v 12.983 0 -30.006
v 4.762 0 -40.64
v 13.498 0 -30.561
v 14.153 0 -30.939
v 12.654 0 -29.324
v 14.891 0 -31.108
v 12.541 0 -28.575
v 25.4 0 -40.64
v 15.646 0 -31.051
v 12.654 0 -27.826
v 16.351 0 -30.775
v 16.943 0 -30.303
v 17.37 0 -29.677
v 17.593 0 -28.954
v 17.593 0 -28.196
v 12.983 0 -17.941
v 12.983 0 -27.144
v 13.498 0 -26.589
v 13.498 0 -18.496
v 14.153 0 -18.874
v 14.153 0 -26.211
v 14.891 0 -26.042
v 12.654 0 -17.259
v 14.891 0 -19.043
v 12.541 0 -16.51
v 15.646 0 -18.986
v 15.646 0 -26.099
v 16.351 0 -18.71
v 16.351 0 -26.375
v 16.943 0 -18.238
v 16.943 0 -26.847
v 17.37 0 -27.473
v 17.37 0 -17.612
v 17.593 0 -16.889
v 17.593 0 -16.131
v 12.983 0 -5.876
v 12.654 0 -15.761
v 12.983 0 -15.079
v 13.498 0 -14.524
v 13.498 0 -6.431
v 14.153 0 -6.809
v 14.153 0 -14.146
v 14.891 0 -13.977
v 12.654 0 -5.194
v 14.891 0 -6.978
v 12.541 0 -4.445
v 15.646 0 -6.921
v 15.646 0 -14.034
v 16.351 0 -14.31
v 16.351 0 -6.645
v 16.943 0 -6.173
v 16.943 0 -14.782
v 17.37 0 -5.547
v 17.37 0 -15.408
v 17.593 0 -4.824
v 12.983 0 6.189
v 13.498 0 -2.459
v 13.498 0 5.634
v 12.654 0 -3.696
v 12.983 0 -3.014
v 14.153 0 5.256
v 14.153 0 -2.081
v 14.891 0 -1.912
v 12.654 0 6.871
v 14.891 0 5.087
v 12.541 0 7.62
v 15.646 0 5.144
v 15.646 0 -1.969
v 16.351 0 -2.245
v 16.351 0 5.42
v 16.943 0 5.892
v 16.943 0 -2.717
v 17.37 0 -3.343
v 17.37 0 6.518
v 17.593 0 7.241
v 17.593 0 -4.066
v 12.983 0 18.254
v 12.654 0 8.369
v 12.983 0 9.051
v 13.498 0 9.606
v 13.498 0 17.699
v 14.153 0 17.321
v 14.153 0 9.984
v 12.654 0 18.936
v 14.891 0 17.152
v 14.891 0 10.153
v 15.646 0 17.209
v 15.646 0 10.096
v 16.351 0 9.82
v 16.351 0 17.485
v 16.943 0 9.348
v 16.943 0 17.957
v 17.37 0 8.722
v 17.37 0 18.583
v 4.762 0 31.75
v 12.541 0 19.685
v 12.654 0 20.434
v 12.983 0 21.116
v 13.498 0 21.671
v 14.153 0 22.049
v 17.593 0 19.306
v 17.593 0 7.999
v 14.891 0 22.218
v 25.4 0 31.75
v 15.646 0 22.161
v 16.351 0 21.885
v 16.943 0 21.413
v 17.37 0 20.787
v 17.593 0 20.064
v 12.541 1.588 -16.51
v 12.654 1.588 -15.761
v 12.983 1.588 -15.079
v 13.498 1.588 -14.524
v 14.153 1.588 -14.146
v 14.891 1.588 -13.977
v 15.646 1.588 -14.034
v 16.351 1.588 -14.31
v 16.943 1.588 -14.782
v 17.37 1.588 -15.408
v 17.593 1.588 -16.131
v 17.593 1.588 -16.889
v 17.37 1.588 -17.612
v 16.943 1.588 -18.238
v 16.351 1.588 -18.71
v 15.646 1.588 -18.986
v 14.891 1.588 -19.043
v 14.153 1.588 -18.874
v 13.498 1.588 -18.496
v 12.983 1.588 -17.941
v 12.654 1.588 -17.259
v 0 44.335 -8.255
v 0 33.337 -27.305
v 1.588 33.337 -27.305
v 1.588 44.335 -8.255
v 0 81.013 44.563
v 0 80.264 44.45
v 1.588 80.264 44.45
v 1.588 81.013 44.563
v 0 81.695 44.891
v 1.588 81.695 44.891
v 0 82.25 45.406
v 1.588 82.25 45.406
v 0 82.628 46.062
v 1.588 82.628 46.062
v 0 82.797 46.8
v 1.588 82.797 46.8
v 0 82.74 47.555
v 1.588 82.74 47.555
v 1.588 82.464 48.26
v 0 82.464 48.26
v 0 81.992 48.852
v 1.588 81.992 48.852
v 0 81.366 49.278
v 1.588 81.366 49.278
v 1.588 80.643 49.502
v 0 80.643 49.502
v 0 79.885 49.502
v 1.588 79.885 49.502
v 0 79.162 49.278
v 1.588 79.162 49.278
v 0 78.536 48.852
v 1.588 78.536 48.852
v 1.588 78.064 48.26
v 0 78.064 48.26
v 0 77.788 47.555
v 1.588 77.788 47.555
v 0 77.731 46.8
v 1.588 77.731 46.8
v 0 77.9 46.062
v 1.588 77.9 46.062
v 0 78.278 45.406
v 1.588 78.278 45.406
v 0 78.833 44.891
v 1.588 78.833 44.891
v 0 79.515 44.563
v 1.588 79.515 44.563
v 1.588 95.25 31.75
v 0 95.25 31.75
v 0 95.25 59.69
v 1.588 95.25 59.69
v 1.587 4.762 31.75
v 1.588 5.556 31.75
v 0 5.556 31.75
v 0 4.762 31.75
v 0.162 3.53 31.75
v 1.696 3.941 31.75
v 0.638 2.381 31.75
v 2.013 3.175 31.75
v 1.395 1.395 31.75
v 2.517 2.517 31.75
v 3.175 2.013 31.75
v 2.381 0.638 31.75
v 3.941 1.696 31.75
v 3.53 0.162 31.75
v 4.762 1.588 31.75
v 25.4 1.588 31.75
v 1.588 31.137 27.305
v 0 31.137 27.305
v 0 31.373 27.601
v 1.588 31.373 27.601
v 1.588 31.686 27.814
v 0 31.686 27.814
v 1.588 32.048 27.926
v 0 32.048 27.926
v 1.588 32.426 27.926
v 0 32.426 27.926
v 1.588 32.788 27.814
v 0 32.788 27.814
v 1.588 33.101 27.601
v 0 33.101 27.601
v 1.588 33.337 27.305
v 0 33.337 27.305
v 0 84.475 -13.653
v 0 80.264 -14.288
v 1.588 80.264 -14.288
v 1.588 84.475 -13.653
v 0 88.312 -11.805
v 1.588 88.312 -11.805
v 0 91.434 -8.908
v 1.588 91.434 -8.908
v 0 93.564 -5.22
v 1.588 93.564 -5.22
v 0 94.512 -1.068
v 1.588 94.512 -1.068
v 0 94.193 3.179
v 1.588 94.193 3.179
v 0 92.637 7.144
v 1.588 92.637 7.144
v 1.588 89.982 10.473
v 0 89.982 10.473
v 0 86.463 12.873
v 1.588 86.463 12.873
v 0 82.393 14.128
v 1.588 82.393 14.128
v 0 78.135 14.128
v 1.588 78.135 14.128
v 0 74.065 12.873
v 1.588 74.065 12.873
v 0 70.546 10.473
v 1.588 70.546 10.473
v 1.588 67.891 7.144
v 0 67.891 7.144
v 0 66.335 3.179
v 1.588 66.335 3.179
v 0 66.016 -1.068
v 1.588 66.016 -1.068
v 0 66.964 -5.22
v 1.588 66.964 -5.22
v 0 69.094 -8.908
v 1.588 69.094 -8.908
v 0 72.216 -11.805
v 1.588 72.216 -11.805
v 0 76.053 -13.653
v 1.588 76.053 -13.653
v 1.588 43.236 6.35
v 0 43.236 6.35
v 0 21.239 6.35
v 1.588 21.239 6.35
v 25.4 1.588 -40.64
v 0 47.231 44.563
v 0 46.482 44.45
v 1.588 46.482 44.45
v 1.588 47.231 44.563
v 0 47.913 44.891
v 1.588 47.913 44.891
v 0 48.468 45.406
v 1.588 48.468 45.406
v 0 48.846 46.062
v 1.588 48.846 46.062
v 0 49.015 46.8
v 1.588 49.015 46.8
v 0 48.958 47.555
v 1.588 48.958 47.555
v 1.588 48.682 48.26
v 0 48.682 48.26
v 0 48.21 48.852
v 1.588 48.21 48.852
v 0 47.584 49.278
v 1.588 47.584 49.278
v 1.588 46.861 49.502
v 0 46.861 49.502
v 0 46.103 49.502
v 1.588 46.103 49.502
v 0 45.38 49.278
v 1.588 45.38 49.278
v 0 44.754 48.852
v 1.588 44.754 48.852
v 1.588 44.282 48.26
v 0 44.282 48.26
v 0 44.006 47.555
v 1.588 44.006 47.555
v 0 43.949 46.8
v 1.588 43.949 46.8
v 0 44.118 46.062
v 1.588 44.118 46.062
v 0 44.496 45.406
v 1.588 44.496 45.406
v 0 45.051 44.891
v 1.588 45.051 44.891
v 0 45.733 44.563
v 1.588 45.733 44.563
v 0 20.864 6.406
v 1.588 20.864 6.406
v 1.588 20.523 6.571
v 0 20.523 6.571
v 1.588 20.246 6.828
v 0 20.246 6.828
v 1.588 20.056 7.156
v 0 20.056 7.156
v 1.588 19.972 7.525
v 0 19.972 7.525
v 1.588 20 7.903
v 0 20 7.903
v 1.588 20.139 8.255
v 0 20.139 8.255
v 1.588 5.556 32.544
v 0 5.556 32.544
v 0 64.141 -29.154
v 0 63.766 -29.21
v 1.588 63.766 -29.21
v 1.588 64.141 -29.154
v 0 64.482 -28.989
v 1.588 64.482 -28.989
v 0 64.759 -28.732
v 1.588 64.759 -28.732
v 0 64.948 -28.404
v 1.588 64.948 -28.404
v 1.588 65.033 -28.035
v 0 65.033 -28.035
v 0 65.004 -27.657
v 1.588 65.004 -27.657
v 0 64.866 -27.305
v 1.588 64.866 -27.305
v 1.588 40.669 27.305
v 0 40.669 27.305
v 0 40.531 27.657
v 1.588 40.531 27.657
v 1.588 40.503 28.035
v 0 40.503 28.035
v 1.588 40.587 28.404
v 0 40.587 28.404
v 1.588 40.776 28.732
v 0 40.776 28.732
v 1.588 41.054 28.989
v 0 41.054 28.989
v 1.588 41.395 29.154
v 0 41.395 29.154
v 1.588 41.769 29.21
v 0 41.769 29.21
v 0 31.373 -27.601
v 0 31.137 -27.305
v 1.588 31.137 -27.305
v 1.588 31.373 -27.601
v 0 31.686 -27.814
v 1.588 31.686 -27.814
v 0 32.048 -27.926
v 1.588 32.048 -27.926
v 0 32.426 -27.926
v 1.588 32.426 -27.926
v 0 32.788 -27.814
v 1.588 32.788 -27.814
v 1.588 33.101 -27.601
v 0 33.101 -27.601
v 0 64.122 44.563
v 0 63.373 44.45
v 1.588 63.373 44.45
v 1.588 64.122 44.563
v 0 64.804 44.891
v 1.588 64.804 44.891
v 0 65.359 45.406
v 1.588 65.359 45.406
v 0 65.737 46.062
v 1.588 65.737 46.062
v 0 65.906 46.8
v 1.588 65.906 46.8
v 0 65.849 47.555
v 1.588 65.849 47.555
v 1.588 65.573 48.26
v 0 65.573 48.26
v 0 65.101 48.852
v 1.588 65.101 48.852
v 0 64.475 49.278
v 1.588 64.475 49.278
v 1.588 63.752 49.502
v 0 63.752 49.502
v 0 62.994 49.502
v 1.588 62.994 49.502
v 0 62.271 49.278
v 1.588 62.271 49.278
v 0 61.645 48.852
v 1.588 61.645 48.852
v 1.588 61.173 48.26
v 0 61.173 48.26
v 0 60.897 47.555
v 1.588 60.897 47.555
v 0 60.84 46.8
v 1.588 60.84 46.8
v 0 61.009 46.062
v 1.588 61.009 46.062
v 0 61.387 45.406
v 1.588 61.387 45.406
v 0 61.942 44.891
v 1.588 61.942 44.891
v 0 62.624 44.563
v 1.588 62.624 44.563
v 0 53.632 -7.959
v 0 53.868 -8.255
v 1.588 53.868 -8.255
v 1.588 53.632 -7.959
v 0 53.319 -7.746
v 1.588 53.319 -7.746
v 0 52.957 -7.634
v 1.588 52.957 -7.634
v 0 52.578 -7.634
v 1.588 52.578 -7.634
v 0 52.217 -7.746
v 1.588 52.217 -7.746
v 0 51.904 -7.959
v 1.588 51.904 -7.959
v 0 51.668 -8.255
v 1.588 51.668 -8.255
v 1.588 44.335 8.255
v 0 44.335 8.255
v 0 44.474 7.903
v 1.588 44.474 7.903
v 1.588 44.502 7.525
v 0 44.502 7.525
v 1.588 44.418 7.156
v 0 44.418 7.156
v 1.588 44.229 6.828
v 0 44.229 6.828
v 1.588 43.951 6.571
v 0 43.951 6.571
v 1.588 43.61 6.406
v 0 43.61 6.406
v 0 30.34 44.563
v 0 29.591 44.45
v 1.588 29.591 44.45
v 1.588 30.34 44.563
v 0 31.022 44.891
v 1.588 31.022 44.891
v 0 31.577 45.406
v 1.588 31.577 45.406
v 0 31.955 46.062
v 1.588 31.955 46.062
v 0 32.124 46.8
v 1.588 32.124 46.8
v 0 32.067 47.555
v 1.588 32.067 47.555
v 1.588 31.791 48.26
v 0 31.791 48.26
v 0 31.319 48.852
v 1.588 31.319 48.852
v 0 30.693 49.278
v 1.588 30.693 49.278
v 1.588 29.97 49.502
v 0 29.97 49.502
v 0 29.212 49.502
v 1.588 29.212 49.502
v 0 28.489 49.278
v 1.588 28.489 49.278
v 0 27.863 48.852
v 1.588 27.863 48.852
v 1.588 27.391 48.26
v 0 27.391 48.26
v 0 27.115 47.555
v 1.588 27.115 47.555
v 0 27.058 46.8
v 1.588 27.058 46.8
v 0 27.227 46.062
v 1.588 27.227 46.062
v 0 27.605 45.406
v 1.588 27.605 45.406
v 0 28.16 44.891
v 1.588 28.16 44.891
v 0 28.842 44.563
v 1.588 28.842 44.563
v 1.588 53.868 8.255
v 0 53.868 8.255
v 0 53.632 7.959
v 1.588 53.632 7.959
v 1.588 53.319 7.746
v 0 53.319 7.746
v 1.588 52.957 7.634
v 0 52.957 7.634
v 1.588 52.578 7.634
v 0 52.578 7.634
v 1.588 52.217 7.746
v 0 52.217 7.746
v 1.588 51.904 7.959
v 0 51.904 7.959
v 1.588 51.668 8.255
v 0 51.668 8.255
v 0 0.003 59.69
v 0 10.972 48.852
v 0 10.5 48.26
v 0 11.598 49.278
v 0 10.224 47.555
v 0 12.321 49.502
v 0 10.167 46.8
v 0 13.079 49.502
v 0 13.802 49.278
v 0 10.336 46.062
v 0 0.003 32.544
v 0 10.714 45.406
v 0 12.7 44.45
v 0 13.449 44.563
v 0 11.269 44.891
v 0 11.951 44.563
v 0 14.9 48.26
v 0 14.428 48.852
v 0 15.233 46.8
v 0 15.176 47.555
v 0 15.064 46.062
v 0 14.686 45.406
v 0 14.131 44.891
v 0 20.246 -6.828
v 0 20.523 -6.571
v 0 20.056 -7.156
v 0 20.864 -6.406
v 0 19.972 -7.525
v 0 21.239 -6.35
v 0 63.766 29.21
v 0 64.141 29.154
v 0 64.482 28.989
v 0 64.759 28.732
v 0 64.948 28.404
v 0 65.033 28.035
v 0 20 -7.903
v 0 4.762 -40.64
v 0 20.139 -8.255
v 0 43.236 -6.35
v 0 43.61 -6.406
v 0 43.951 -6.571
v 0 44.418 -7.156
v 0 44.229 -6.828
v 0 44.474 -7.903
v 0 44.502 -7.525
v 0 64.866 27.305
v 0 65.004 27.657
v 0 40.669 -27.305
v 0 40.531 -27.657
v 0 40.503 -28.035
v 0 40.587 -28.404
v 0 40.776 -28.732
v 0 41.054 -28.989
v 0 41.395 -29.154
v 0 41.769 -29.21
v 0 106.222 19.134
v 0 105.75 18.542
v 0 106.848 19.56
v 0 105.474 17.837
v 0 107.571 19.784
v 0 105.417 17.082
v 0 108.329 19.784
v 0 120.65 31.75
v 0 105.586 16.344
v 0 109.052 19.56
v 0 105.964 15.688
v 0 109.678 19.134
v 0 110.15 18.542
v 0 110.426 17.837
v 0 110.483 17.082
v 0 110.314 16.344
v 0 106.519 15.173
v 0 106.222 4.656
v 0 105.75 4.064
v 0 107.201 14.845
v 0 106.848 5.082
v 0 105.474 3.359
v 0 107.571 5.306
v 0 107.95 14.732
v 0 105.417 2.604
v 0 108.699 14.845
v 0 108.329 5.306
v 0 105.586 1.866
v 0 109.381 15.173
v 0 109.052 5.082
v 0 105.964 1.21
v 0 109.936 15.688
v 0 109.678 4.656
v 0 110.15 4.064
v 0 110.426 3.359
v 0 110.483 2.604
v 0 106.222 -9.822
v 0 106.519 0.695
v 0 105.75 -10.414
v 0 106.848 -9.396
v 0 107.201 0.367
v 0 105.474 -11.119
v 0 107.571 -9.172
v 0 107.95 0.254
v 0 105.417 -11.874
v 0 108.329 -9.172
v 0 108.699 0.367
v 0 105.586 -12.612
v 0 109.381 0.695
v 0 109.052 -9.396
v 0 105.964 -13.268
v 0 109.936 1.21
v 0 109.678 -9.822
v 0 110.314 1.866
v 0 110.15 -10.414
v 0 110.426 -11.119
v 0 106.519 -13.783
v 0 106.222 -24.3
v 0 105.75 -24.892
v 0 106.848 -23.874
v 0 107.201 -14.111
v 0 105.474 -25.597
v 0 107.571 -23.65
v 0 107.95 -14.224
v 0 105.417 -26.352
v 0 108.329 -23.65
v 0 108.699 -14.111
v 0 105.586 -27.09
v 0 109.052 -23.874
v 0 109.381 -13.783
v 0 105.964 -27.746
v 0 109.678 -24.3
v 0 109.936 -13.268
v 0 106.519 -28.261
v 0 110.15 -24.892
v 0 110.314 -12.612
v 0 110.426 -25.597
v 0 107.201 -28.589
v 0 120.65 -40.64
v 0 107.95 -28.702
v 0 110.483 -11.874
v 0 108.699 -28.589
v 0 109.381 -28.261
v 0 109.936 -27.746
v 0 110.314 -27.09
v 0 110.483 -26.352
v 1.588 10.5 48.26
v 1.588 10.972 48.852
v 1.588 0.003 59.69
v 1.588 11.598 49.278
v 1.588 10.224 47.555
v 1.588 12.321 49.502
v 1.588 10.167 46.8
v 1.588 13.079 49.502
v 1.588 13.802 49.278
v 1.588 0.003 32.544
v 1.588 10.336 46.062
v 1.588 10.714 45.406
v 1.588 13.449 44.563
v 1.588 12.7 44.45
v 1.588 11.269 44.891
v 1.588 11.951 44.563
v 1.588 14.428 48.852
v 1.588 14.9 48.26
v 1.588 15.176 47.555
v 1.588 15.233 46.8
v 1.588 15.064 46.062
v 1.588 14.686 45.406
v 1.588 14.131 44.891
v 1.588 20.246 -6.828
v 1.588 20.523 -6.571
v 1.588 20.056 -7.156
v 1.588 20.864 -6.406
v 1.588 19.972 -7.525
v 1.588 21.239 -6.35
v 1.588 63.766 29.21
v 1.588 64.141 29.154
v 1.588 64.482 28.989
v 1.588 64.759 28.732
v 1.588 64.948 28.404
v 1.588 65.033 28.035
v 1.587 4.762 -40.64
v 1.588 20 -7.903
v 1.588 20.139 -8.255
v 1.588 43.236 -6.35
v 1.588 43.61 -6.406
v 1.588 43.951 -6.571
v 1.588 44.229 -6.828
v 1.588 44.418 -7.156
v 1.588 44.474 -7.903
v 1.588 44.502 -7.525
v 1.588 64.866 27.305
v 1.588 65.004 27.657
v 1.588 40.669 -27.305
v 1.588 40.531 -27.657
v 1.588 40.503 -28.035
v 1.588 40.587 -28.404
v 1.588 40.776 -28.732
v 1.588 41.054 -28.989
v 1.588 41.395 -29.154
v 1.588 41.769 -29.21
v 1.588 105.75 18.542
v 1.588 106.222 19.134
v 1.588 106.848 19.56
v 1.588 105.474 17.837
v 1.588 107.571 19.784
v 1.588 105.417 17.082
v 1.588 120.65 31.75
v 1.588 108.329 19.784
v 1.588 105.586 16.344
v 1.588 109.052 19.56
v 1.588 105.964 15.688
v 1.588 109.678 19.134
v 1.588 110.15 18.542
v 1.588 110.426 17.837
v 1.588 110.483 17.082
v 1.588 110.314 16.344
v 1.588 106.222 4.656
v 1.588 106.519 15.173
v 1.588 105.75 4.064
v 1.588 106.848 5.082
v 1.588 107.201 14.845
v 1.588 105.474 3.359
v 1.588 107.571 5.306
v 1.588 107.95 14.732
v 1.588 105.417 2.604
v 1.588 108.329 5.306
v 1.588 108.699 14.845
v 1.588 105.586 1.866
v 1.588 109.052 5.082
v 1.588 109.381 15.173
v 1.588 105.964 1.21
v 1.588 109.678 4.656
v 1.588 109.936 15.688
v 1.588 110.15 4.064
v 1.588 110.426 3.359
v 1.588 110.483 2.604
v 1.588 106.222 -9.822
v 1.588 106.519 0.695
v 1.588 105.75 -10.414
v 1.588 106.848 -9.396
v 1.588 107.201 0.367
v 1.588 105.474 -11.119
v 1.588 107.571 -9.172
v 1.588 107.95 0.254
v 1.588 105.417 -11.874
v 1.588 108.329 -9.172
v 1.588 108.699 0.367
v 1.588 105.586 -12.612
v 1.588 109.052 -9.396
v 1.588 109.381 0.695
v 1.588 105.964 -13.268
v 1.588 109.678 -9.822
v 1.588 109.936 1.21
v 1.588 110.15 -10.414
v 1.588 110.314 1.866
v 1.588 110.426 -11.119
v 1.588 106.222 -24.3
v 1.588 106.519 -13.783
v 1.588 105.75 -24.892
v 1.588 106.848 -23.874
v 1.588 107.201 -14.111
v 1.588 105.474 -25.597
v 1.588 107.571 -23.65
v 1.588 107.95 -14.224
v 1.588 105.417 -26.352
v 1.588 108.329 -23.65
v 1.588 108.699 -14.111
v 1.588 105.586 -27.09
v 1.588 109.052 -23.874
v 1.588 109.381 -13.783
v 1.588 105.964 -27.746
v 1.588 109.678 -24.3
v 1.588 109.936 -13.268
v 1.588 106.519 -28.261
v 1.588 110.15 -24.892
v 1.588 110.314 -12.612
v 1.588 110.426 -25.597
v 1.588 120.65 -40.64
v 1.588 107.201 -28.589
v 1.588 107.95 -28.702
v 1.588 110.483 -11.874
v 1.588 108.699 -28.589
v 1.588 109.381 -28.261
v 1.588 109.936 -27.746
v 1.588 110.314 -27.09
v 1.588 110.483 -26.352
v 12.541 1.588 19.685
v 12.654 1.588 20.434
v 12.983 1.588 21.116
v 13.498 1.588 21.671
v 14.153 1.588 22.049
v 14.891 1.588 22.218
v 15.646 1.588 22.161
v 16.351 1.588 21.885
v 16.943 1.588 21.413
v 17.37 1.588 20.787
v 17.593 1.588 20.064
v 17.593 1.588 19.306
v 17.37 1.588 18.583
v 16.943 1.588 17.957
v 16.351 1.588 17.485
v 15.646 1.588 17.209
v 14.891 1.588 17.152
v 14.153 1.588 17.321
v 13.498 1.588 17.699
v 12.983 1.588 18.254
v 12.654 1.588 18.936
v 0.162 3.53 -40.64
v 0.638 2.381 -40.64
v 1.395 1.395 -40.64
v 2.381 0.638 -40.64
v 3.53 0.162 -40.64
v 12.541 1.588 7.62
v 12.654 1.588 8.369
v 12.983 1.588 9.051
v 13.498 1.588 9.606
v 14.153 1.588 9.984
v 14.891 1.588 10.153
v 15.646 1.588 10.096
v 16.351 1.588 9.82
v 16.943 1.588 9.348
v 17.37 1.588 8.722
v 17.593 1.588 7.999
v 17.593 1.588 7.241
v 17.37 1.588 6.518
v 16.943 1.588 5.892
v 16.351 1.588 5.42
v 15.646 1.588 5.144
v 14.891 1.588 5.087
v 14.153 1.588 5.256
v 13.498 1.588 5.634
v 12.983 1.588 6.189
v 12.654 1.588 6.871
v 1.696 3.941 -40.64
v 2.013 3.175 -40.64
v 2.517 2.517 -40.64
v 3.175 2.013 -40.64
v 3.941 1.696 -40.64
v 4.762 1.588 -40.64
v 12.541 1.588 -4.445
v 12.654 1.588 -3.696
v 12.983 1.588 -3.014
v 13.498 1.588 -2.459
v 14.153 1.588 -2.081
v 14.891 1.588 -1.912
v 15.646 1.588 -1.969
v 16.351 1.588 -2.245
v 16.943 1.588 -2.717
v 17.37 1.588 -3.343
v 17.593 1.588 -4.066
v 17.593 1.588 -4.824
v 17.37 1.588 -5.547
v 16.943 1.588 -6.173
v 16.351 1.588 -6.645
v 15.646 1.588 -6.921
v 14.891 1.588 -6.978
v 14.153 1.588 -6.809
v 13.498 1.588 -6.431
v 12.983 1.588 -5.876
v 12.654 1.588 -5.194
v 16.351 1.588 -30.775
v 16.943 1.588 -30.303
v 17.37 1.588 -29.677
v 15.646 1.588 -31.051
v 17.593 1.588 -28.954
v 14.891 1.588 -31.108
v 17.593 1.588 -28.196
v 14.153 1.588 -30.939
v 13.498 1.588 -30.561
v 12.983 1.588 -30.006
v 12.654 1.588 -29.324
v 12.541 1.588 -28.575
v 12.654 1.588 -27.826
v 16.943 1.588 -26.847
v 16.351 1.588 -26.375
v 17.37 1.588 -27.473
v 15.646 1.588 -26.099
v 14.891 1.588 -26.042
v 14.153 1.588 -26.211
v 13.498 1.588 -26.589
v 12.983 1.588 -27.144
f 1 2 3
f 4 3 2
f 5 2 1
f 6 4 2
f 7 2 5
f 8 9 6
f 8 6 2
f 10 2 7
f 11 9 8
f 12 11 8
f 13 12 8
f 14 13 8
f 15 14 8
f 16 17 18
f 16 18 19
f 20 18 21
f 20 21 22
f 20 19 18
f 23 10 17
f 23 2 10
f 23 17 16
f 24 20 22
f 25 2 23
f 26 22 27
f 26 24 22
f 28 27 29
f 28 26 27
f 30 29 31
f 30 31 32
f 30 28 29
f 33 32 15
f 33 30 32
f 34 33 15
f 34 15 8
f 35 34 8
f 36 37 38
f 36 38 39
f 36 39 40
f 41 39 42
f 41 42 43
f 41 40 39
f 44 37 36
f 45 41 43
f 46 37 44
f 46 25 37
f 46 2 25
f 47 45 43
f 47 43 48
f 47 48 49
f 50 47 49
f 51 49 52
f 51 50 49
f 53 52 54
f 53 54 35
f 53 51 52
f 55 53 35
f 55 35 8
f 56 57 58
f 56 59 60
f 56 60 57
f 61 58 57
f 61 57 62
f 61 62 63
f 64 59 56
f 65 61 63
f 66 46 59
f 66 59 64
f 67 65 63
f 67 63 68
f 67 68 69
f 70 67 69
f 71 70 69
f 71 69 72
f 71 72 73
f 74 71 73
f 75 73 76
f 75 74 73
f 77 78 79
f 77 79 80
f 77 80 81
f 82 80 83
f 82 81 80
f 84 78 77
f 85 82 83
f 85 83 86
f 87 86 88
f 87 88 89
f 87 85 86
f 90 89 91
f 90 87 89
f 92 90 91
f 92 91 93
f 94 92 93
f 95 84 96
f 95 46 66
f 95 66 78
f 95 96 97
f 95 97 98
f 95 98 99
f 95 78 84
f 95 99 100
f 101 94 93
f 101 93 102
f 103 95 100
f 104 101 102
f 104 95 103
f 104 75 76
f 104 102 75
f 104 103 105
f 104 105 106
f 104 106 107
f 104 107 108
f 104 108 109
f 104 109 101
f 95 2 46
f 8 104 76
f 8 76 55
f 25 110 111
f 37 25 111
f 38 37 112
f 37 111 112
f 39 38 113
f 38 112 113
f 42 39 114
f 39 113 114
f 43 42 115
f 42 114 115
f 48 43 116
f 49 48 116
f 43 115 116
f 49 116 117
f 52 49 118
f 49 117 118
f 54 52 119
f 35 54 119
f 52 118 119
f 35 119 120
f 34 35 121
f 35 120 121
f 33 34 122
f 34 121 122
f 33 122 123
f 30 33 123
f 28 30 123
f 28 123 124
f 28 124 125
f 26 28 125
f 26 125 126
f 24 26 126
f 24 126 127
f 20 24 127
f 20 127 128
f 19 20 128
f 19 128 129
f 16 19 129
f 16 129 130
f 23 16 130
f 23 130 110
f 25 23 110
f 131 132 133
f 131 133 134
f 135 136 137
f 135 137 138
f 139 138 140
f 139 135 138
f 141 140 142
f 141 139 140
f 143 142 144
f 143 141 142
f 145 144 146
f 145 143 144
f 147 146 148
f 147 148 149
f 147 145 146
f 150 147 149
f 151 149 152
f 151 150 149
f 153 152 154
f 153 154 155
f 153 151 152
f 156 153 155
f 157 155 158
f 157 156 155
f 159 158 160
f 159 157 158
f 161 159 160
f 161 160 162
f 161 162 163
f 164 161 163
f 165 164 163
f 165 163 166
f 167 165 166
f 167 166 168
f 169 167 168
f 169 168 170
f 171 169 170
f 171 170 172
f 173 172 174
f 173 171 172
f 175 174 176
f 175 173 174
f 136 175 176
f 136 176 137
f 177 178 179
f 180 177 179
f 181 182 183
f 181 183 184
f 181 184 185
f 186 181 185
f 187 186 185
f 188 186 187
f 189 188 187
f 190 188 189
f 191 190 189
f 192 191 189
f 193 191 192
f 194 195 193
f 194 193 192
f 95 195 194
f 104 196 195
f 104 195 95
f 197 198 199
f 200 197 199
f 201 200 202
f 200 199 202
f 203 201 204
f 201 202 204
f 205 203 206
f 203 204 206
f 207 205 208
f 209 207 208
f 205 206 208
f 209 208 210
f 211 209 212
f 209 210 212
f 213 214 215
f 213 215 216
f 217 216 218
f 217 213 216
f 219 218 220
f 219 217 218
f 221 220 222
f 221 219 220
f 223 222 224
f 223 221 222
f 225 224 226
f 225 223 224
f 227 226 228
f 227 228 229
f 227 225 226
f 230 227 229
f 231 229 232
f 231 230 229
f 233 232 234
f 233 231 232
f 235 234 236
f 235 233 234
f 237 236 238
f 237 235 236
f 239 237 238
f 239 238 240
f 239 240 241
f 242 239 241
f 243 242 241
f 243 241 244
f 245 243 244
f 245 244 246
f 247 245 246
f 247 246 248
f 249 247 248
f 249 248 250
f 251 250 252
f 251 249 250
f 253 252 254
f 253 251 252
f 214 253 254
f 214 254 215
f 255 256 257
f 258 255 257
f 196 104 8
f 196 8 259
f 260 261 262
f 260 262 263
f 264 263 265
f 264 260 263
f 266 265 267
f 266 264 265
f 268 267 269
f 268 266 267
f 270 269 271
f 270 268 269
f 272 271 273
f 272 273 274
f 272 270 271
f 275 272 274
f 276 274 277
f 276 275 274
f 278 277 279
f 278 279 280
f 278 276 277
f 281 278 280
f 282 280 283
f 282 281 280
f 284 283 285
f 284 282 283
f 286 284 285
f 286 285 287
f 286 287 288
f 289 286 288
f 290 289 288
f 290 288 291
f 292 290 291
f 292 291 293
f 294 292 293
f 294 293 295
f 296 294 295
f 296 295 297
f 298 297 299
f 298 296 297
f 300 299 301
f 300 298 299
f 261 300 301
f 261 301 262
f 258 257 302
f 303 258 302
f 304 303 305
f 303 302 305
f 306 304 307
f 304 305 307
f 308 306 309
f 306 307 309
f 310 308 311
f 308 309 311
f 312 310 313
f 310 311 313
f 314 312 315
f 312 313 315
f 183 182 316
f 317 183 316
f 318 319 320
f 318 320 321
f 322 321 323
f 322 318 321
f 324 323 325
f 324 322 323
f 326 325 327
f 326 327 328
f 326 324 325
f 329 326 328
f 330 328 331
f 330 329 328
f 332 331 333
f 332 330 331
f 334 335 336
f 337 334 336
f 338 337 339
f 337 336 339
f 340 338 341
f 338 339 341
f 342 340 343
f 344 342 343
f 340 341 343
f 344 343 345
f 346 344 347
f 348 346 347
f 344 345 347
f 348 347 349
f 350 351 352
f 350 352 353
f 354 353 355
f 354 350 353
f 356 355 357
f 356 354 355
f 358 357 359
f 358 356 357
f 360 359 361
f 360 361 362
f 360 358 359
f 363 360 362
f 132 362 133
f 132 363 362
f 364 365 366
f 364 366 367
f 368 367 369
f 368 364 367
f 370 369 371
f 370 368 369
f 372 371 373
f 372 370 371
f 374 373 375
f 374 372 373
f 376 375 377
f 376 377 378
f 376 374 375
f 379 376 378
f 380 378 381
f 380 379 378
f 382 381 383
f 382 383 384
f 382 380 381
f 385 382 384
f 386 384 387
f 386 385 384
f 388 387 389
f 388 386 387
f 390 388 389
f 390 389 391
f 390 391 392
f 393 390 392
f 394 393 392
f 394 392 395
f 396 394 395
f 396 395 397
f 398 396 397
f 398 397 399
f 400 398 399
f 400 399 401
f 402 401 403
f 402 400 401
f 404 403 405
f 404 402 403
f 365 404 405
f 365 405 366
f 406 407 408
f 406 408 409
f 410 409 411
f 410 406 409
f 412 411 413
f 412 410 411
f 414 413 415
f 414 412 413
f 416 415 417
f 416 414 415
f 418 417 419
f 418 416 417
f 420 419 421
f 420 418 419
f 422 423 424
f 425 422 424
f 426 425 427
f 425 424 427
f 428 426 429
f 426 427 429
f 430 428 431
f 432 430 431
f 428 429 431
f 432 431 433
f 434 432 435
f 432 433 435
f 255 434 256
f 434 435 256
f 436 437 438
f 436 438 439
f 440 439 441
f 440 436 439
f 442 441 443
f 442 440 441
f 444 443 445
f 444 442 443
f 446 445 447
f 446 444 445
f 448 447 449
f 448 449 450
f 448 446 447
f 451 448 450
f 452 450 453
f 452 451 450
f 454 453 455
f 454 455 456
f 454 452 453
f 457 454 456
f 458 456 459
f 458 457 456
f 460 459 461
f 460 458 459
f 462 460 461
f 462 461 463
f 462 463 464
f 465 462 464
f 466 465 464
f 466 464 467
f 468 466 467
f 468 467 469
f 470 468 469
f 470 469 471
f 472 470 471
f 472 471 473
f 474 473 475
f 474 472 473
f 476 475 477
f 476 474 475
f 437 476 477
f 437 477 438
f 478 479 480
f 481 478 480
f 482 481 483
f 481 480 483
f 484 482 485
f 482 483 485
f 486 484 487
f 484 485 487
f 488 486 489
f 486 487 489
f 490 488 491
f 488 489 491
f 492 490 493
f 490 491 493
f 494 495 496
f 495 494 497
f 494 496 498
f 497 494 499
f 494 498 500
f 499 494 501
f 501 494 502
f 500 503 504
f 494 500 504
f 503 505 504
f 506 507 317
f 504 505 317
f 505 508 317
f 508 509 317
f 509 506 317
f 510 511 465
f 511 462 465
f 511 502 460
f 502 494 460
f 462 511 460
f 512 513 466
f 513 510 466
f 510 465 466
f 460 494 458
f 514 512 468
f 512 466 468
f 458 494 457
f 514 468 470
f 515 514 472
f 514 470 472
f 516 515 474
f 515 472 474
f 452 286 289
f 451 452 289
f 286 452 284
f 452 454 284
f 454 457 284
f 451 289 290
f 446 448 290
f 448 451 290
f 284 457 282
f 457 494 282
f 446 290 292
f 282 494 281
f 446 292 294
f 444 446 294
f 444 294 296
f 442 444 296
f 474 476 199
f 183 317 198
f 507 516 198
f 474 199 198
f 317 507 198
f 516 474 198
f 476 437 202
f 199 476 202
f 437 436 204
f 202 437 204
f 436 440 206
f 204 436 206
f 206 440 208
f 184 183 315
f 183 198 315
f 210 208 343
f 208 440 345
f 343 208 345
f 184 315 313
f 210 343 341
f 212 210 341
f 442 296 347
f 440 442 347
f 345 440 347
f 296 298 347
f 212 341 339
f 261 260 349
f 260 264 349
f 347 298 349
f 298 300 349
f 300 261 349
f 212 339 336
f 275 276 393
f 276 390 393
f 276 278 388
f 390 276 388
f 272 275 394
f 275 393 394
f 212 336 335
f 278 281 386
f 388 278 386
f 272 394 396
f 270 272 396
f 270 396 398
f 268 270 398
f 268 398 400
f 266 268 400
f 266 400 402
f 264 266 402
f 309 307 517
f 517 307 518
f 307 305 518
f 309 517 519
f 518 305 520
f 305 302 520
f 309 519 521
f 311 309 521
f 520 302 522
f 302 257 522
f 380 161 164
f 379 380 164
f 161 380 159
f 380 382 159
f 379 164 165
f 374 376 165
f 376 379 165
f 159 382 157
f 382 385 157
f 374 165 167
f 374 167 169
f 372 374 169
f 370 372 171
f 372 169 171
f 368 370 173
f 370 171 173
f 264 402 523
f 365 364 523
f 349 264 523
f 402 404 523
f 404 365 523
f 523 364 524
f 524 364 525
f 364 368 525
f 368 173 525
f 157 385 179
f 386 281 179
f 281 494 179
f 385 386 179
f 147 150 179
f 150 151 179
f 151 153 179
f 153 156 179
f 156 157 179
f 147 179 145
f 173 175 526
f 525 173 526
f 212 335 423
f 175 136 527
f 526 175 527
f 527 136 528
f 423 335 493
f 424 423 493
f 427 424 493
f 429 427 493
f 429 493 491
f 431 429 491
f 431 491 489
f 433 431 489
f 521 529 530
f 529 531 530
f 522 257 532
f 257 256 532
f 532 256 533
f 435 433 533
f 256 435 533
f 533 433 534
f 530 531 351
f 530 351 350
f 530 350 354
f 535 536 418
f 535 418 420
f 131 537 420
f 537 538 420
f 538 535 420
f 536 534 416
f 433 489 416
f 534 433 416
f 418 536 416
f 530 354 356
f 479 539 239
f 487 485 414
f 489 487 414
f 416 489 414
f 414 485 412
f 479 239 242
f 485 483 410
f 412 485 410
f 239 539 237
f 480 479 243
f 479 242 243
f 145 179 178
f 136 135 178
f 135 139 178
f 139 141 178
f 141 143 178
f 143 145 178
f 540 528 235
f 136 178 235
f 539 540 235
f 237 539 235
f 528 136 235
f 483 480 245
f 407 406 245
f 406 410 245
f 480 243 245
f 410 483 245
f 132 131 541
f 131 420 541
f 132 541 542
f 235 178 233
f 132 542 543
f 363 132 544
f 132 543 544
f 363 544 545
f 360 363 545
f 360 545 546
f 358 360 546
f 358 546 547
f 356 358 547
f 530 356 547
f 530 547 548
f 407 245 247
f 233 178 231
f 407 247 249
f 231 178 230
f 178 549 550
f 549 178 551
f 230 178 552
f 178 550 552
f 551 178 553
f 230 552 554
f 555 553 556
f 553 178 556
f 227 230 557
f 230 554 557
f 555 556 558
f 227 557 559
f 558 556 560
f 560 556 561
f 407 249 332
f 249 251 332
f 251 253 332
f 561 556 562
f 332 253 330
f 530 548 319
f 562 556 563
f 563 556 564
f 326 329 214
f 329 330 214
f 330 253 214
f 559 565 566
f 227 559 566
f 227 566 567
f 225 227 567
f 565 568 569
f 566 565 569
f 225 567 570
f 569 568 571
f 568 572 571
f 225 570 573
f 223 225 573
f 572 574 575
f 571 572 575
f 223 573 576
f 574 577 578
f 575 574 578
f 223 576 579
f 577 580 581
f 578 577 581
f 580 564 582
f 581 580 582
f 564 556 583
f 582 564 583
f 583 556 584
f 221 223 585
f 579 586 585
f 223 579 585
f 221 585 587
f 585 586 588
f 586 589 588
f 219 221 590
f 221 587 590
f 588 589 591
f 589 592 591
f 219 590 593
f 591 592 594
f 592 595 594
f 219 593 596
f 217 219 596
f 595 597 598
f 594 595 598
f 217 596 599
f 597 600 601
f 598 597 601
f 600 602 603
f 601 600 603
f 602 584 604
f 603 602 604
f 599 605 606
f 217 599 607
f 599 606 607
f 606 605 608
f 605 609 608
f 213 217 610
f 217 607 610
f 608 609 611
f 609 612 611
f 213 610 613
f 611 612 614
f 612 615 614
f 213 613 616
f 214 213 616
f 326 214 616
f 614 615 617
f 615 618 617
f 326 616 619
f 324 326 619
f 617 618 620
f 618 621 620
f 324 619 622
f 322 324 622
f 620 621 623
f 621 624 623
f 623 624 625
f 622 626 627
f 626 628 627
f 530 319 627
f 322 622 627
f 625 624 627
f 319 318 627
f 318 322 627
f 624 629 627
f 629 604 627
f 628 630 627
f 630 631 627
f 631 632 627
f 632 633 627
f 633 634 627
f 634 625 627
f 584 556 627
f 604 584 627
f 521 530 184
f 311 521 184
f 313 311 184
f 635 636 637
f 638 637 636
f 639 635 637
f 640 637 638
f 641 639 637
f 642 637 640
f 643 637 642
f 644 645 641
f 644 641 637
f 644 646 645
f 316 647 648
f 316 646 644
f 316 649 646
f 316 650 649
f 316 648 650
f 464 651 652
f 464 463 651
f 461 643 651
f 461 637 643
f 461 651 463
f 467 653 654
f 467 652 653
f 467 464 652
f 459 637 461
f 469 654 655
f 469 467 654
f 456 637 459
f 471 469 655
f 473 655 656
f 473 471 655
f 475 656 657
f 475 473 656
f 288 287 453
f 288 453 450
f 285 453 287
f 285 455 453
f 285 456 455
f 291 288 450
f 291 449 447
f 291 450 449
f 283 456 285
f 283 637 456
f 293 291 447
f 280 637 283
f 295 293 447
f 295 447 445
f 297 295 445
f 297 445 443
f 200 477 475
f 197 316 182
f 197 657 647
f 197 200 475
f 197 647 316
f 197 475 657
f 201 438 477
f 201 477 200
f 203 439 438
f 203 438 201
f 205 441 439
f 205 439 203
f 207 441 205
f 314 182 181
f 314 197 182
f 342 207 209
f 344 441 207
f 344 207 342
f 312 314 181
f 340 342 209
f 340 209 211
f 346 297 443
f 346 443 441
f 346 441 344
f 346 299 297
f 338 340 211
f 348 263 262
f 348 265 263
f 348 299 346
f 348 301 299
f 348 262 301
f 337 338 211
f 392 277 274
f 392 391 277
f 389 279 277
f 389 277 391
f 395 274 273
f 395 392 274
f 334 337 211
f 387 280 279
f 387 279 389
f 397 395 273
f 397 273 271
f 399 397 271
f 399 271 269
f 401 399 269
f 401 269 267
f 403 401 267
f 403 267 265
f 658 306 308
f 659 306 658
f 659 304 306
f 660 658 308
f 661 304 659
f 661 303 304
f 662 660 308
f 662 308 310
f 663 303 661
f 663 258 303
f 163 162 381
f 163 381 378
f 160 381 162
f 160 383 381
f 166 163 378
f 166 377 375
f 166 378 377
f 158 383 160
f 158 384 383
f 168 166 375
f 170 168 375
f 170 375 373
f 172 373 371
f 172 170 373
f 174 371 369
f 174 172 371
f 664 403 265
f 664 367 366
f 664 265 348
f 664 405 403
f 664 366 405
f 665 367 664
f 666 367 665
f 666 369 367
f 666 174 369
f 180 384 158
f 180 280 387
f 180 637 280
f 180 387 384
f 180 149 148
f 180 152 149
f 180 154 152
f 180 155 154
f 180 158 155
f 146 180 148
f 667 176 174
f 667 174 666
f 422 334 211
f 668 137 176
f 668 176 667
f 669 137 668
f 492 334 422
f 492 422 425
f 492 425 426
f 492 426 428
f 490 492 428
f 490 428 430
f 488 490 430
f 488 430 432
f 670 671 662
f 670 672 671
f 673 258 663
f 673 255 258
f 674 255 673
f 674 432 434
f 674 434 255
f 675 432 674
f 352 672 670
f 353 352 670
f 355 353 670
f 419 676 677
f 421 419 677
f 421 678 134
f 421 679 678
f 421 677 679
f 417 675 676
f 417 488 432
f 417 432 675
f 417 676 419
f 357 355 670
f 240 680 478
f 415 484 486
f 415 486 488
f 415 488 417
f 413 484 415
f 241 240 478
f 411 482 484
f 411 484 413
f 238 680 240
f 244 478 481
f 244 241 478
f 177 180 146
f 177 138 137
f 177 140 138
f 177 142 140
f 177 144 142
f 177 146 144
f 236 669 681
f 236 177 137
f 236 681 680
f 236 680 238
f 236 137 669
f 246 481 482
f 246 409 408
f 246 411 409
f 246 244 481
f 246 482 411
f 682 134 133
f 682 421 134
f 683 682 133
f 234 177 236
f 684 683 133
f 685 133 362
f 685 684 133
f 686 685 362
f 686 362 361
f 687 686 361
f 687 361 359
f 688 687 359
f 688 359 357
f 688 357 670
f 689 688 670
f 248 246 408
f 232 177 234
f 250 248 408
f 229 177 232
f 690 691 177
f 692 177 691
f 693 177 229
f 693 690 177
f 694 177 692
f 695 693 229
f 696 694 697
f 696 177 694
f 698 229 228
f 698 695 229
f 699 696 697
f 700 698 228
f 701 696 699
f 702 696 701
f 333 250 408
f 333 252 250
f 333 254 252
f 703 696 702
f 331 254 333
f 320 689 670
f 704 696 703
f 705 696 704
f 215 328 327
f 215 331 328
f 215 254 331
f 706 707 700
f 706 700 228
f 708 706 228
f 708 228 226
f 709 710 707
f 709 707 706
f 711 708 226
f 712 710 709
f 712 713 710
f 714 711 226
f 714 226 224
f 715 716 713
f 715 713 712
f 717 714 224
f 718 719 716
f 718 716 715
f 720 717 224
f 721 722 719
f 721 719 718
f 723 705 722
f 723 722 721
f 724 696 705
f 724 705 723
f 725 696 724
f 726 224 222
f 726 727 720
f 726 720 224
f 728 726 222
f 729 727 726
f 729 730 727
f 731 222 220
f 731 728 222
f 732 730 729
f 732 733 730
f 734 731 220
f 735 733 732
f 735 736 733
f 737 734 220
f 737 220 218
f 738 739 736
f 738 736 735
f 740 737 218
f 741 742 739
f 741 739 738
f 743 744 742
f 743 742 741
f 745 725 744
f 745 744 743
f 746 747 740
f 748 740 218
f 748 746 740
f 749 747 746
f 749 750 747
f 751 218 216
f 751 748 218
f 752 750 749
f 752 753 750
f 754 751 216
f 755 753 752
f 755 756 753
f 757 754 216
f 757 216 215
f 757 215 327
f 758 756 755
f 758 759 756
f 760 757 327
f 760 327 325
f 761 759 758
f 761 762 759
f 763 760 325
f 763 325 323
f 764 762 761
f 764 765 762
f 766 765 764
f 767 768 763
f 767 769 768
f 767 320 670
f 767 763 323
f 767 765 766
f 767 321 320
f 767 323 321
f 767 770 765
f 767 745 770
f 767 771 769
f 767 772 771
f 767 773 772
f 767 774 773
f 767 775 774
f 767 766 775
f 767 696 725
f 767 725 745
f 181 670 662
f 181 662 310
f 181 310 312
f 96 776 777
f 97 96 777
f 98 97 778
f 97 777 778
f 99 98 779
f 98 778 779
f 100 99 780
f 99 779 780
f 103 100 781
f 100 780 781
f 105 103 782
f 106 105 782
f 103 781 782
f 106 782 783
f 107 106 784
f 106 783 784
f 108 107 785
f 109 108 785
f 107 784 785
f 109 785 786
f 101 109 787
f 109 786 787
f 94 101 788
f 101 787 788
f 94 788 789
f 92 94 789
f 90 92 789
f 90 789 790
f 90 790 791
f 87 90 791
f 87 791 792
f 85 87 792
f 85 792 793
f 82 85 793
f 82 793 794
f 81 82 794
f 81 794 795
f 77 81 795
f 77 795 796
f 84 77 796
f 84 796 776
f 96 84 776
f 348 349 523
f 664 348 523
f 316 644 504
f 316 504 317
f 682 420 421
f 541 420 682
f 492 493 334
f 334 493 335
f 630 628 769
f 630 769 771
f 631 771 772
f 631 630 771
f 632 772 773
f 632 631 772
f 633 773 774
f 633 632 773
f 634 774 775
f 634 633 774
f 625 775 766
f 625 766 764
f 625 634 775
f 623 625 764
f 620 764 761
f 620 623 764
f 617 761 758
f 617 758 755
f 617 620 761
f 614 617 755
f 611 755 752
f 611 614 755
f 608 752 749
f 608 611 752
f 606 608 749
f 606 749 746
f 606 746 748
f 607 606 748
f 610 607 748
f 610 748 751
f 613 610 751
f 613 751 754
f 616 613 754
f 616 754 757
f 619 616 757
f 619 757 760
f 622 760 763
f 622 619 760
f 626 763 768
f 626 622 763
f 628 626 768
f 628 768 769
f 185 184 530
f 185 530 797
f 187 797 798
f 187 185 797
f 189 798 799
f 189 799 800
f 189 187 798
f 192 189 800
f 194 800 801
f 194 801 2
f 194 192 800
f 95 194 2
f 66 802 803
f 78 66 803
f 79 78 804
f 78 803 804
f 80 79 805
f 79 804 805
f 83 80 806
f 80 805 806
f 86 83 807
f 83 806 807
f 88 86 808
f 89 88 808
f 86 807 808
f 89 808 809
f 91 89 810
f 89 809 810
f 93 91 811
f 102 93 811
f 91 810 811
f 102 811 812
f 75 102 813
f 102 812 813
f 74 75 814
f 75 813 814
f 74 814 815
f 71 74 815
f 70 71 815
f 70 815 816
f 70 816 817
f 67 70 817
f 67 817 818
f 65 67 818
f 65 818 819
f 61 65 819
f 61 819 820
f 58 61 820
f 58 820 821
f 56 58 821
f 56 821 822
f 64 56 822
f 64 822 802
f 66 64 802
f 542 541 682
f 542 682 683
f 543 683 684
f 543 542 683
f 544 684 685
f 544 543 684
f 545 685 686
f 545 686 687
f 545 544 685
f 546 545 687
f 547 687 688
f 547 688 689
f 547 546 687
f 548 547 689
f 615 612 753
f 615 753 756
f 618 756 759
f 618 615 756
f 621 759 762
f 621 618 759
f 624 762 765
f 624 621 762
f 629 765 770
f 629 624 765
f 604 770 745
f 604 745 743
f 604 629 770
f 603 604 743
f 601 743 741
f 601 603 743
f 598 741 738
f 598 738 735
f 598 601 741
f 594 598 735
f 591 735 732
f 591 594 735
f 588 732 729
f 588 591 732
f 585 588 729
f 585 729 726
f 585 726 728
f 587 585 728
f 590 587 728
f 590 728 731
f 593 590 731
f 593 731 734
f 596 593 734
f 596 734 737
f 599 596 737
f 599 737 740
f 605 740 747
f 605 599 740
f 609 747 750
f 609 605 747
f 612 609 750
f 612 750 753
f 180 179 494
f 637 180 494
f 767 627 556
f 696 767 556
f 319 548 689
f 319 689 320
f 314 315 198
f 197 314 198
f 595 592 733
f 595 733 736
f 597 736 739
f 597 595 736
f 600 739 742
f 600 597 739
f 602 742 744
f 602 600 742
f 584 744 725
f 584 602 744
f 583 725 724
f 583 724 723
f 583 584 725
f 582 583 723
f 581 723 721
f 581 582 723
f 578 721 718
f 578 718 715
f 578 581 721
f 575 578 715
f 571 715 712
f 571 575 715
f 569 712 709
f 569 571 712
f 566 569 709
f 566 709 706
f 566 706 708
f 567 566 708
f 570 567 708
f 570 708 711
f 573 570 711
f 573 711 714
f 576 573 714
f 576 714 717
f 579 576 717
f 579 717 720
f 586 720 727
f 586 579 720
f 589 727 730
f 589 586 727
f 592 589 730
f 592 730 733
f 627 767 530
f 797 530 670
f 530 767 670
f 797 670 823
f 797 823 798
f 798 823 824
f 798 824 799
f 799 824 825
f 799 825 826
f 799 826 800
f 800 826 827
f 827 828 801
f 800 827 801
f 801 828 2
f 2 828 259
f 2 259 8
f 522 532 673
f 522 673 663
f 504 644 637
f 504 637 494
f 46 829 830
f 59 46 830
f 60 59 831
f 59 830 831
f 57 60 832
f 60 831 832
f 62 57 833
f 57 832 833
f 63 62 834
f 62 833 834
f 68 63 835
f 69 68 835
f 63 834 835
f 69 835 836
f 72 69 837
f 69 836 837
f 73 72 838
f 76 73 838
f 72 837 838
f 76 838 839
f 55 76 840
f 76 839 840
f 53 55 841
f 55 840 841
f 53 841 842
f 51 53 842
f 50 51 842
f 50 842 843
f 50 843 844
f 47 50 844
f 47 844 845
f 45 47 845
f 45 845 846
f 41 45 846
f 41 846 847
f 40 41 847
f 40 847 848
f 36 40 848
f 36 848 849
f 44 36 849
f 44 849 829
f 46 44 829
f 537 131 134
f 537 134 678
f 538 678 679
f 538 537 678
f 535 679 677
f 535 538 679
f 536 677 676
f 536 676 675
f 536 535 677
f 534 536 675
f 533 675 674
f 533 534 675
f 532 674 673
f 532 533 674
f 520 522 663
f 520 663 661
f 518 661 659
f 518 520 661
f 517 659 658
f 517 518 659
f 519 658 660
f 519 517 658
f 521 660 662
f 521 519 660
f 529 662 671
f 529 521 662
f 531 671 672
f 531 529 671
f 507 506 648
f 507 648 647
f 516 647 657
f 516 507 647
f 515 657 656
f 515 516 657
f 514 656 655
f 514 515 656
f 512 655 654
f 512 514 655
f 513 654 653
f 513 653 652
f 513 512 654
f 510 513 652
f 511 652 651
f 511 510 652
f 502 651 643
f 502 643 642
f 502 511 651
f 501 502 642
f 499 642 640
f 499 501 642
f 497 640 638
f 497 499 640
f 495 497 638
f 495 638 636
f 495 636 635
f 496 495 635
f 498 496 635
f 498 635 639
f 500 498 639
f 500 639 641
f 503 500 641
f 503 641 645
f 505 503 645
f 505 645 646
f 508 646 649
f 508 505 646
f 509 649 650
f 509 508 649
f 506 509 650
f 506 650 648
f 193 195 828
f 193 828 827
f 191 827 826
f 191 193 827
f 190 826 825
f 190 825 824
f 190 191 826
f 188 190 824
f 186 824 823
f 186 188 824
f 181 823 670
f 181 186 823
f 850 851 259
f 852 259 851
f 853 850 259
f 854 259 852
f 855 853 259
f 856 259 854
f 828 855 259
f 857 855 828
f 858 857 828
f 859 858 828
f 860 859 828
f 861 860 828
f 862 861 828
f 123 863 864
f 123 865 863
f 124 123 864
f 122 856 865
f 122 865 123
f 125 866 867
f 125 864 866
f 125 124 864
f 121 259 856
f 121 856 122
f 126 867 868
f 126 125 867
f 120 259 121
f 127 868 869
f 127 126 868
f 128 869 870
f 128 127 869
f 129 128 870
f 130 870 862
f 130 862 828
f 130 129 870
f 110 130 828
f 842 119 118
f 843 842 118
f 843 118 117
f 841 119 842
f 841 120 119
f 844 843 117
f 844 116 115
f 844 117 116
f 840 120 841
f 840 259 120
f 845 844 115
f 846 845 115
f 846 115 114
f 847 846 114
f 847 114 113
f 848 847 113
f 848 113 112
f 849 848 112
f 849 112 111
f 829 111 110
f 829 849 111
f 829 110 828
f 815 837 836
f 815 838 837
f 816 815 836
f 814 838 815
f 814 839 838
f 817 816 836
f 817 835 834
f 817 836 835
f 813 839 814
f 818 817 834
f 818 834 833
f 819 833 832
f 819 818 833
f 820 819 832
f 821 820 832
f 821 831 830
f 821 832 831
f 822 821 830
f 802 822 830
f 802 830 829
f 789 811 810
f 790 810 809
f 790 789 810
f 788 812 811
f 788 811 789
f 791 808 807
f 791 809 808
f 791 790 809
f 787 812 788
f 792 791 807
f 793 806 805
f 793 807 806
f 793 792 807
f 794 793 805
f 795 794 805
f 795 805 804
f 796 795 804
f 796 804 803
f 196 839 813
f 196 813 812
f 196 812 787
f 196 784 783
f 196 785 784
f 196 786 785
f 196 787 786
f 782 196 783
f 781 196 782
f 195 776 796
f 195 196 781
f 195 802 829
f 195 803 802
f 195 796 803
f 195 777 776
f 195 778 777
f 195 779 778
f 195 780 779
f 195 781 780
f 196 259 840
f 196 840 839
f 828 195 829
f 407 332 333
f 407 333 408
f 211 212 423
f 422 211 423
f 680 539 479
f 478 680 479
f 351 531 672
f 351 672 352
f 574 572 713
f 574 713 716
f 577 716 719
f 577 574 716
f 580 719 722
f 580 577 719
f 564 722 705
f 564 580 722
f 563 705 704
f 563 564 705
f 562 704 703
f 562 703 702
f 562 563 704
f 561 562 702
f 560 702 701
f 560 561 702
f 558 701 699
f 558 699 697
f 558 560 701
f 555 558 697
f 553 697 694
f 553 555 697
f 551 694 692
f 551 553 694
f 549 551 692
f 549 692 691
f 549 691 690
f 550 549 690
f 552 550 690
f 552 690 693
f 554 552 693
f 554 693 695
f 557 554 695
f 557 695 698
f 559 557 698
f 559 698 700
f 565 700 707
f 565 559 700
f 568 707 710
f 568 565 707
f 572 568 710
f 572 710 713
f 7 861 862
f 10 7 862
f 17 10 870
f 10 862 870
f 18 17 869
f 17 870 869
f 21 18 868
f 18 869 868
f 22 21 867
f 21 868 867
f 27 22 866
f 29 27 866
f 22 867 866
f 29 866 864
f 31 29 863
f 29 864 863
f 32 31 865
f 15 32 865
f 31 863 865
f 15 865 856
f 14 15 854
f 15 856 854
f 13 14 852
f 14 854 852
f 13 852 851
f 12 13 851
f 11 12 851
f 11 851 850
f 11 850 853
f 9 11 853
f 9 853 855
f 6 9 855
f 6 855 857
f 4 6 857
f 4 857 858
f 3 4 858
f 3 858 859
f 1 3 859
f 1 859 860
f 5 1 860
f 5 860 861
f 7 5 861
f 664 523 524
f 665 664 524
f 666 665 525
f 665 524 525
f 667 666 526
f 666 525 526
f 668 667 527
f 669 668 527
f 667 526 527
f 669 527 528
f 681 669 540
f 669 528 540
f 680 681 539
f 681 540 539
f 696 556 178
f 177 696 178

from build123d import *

# Parameters (mm, degrees)
SKETCH2_R                     = 14.2875
SKETCH2_R_2                   = 2.54
BOSS_EXTRUDE1_DEPTH           = 1.5875
SKETCH7_W                     = 1.5875
SKETCH7_H                     = 27.94
CUT_EXTRUDE1_DEPTH            = 0.00254
EDGE_FLANGE2_STRIP_W          = 12.7
EDGE_FLANGE2_STRIP_H          = 1.5875
EDGE_FLANGE2_STRIP_CUT_DEPTH  = 72.39
EDGE_FLANGE2_RELIEF_W         = 13.49375
EDGE_FLANGE2_RELIEF_H         = 0.79375
EDGE_FLANGE2_RELIEF_CUT_DEPTH = 1.5875
EDGE_FLANGE2_DEPTH            = 72.39
SKETCH14_R                    = 2.54
CUT_EXTRUDE2_DEPTH            = 2.54


# Sheet-metal steps are written as plain solids
with BuildPart() as part:
    # Sketch2 → Boss-Extrude1 (new body)
    with BuildSketch(Plane(origin=(0, 0, 0), x_dir=(0, 0, -1), z_dir=(1, 0, 0))):
        Polygon((-59.69, 95.25), (-59.69, 0), (40.64, 0), (40.64, 95.25), (40.64, 120.65), (-31.75, 120.65), (-31.75, 95.25), align=None)
        with Locations((0, 80.264)):
            Circle(SKETCH2_R, mode=Mode.SUBTRACT)
        with Locations((-46.99, 80.264)):
            Circle(SKETCH2_R_2, mode=Mode.SUBTRACT)
        with Locations((-46.99, 63.373)):
            Circle(SKETCH2_R_2, mode=Mode.SUBTRACT)
        with Locations((-17.272, 107.95)):
            Circle(SKETCH2_R_2, mode=Mode.SUBTRACT)
        with Locations((-2.794, 107.95)):
            Circle(SKETCH2_R_2, mode=Mode.SUBTRACT)
        with Locations((11.684, 107.95)):
            Circle(SKETCH2_R_2, mode=Mode.SUBTRACT)
        with Locations((26.162, 107.95)):
            Circle(SKETCH2_R_2, mode=Mode.SUBTRACT)
        with Locations((-46.99, 46.482)):
            Circle(SKETCH2_R_2, mode=Mode.SUBTRACT)
        with Locations((-46.99, 29.591)):
            Circle(SKETCH2_R_2, mode=Mode.SUBTRACT)
        with Locations((-46.99, 12.7)):
            Circle(SKETCH2_R_2, mode=Mode.SUBTRACT)
        with BuildLine():
            Line((-27.305, 64.866068321), (-8.255, 53.867545693))
            ThreePointArc((-8.255, 53.867545693), (-7.62, 52.76769343), (-8.255, 51.667841167))
            Line((-8.255, 51.667841167), (-27.305, 40.669318539))
            ThreePointArc((-27.305, 40.669318539), (-28.575, 40.669318539), (-29.21, 41.769170802))
            Line((-29.21, 41.769170802), (-29.21, 63.766216058))
            ThreePointArc((-29.21, 63.766216058), (-28.575, 64.866068321), (-27.305, 64.866068321))
        make_face(mode=Mode.SUBTRACT)
        with BuildLine():
            Line((-6.35, 43.235640486), (-6.35, 21.238595229))
            ThreePointArc((-6.35, 21.238595229), (-6.985, 20.138742967), (-8.255, 20.138742967))
            Line((-8.255, 20.138742967), (-27.305, 31.137265595))
            ThreePointArc((-27.305, 31.137265595), (-27.94, 32.237117857), (-27.305, 33.33697012))
            Line((-27.305, 33.33697012), (-8.255, 44.335492748))
            ThreePointArc((-8.255, 44.335492748), (-6.985, 44.335492748), (-6.35, 43.235640486))
        make_face(mode=Mode.SUBTRACT)
        with BuildLine():
            Line((8.255, 20.138742967), (27.305, 31.137265595))
            ThreePointArc((27.305, 31.137265595), (27.94, 32.237117857), (27.305, 33.33697012))
            Line((27.305, 33.33697012), (8.255, 44.335492748))
            ThreePointArc((8.255, 44.335492748), (6.985, 44.335492748), (6.35, 43.235640486))
            Line((6.35, 43.235640486), (6.35, 21.238595229))
            ThreePointArc((6.35, 21.238595229), (6.985, 20.138742967), (8.255, 20.138742967))
        make_face(mode=Mode.SUBTRACT)
        with BuildLine():
            Line((8.255, 51.667841167), (27.305, 40.669318539))
            ThreePointArc((27.305, 40.669318539), (28.575, 40.669318539), (29.21, 41.769170802))
            Line((29.21, 41.769170802), (29.21, 63.766216058))
            ThreePointArc((29.21, 63.766216058), (28.575, 64.866068321), (27.305, 64.866068321))
            Line((27.305, 64.866068321), (8.255, 53.867545693))
            ThreePointArc((8.255, 53.867545693), (7.62, 52.76769343), (8.255, 51.667841167))
        make_face(mode=Mode.SUBTRACT)
    extrude(amount=BOSS_EXTRUDE1_DEPTH)

    # Sketch7 → Cut-Extrude1 (cut)
    with BuildSketch(Plane(origin=(0, 0, 0), x_dir=(-1, 0, 0), z_dir=(0, -1, 0))):
        with Locations((-0.79375, -45.72)):
            Rectangle(SKETCH7_W, SKETCH7_H)
    extrude(amount=-CUT_EXTRUDE1_DEPTH, mode=Mode.SUBTRACT)

    # Edge-Flange2 strip (across the edge) → Edge-Flange2 strip cut (cut)
    with BuildSketch(Plane(origin=(1.5875, 0, 31.75), x_dir=(0, 1, 0), z_dir=(0, 0, -1))):
        with Locations((-1.5875, -0.79375)):
            Rectangle(EDGE_FLANGE2_STRIP_W, EDGE_FLANGE2_STRIP_H)
    extrude(amount=EDGE_FLANGE2_STRIP_CUT_DEPTH, mode=Mode.SUBTRACT)

    # Edge-Flange2 relief (on the sheet) → Edge-Flange2 relief cut (cut)
    with BuildSketch(Plane(origin=(1.5875, 4.7625, 31.75), x_dir=(0, 1, 0), z_dir=(1, 0, 0))):
        with Locations((-5.953125, 0.396875)):
            Rectangle(EDGE_FLANGE2_RELIEF_W, EDGE_FLANGE2_RELIEF_H)
    extrude(amount=-EDGE_FLANGE2_RELIEF_CUT_DEPTH, mode=Mode.SUBTRACT)

    # Edge-Flange2 section (across the edge) → Edge-Flange2 (add)
    with BuildSketch(Plane(origin=(1.5875, 0, 31.75), x_dir=(0, 1, 0), z_dir=(0, 0, -1))):
        with BuildLine():
            Line((0, 3.175), (0, 23.8125))
            Line((0, 23.8125), (1.5875, 23.8125))
            Line((1.5875, 23.8125), (1.5875, 3.175))
            ThreePointArc((1.5875, 3.175), (2.51743597, 0.92993597), (4.7625, 0))
            Line((4.7625, 0), (4.7625, -1.5875))
            ThreePointArc((4.7625, -1.5875), (1.394903955, -0.192596045), (0, 3.175))
        make_face()
    extrude(amount=EDGE_FLANGE2_DEPTH)

    # Sketch14 → Cut-Extrude2 (cut)
    with BuildSketch(Plane(origin=(0, 1.5875, 0), x_dir=(1, 0, 0), z_dir=(0, 1, 0))):
        with Locations(Location((15.08125, -19.685, 0), (0, 0, 180))):
            Circle(SKETCH14_R)
        with Locations(Location((15.08125, -7.62, 0), (0, 0, 180))):
            Circle(SKETCH14_R)
        with Locations(Location((15.08125, 4.445, 0), (0, 0, 180))):
            Circle(SKETCH14_R)
        with Locations(Location((15.08125, 16.51, 0), (0, 0, 180))):
            Circle(SKETCH14_R)
        with Locations(Location((15.08125, 28.575, 0), (0, 0, 180))):
            Circle(SKETCH14_R)
    extrude(amount=-CUT_EXTRUDE2_DEPTH, mode=Mode.SUBTRACT)


solid = part.part
